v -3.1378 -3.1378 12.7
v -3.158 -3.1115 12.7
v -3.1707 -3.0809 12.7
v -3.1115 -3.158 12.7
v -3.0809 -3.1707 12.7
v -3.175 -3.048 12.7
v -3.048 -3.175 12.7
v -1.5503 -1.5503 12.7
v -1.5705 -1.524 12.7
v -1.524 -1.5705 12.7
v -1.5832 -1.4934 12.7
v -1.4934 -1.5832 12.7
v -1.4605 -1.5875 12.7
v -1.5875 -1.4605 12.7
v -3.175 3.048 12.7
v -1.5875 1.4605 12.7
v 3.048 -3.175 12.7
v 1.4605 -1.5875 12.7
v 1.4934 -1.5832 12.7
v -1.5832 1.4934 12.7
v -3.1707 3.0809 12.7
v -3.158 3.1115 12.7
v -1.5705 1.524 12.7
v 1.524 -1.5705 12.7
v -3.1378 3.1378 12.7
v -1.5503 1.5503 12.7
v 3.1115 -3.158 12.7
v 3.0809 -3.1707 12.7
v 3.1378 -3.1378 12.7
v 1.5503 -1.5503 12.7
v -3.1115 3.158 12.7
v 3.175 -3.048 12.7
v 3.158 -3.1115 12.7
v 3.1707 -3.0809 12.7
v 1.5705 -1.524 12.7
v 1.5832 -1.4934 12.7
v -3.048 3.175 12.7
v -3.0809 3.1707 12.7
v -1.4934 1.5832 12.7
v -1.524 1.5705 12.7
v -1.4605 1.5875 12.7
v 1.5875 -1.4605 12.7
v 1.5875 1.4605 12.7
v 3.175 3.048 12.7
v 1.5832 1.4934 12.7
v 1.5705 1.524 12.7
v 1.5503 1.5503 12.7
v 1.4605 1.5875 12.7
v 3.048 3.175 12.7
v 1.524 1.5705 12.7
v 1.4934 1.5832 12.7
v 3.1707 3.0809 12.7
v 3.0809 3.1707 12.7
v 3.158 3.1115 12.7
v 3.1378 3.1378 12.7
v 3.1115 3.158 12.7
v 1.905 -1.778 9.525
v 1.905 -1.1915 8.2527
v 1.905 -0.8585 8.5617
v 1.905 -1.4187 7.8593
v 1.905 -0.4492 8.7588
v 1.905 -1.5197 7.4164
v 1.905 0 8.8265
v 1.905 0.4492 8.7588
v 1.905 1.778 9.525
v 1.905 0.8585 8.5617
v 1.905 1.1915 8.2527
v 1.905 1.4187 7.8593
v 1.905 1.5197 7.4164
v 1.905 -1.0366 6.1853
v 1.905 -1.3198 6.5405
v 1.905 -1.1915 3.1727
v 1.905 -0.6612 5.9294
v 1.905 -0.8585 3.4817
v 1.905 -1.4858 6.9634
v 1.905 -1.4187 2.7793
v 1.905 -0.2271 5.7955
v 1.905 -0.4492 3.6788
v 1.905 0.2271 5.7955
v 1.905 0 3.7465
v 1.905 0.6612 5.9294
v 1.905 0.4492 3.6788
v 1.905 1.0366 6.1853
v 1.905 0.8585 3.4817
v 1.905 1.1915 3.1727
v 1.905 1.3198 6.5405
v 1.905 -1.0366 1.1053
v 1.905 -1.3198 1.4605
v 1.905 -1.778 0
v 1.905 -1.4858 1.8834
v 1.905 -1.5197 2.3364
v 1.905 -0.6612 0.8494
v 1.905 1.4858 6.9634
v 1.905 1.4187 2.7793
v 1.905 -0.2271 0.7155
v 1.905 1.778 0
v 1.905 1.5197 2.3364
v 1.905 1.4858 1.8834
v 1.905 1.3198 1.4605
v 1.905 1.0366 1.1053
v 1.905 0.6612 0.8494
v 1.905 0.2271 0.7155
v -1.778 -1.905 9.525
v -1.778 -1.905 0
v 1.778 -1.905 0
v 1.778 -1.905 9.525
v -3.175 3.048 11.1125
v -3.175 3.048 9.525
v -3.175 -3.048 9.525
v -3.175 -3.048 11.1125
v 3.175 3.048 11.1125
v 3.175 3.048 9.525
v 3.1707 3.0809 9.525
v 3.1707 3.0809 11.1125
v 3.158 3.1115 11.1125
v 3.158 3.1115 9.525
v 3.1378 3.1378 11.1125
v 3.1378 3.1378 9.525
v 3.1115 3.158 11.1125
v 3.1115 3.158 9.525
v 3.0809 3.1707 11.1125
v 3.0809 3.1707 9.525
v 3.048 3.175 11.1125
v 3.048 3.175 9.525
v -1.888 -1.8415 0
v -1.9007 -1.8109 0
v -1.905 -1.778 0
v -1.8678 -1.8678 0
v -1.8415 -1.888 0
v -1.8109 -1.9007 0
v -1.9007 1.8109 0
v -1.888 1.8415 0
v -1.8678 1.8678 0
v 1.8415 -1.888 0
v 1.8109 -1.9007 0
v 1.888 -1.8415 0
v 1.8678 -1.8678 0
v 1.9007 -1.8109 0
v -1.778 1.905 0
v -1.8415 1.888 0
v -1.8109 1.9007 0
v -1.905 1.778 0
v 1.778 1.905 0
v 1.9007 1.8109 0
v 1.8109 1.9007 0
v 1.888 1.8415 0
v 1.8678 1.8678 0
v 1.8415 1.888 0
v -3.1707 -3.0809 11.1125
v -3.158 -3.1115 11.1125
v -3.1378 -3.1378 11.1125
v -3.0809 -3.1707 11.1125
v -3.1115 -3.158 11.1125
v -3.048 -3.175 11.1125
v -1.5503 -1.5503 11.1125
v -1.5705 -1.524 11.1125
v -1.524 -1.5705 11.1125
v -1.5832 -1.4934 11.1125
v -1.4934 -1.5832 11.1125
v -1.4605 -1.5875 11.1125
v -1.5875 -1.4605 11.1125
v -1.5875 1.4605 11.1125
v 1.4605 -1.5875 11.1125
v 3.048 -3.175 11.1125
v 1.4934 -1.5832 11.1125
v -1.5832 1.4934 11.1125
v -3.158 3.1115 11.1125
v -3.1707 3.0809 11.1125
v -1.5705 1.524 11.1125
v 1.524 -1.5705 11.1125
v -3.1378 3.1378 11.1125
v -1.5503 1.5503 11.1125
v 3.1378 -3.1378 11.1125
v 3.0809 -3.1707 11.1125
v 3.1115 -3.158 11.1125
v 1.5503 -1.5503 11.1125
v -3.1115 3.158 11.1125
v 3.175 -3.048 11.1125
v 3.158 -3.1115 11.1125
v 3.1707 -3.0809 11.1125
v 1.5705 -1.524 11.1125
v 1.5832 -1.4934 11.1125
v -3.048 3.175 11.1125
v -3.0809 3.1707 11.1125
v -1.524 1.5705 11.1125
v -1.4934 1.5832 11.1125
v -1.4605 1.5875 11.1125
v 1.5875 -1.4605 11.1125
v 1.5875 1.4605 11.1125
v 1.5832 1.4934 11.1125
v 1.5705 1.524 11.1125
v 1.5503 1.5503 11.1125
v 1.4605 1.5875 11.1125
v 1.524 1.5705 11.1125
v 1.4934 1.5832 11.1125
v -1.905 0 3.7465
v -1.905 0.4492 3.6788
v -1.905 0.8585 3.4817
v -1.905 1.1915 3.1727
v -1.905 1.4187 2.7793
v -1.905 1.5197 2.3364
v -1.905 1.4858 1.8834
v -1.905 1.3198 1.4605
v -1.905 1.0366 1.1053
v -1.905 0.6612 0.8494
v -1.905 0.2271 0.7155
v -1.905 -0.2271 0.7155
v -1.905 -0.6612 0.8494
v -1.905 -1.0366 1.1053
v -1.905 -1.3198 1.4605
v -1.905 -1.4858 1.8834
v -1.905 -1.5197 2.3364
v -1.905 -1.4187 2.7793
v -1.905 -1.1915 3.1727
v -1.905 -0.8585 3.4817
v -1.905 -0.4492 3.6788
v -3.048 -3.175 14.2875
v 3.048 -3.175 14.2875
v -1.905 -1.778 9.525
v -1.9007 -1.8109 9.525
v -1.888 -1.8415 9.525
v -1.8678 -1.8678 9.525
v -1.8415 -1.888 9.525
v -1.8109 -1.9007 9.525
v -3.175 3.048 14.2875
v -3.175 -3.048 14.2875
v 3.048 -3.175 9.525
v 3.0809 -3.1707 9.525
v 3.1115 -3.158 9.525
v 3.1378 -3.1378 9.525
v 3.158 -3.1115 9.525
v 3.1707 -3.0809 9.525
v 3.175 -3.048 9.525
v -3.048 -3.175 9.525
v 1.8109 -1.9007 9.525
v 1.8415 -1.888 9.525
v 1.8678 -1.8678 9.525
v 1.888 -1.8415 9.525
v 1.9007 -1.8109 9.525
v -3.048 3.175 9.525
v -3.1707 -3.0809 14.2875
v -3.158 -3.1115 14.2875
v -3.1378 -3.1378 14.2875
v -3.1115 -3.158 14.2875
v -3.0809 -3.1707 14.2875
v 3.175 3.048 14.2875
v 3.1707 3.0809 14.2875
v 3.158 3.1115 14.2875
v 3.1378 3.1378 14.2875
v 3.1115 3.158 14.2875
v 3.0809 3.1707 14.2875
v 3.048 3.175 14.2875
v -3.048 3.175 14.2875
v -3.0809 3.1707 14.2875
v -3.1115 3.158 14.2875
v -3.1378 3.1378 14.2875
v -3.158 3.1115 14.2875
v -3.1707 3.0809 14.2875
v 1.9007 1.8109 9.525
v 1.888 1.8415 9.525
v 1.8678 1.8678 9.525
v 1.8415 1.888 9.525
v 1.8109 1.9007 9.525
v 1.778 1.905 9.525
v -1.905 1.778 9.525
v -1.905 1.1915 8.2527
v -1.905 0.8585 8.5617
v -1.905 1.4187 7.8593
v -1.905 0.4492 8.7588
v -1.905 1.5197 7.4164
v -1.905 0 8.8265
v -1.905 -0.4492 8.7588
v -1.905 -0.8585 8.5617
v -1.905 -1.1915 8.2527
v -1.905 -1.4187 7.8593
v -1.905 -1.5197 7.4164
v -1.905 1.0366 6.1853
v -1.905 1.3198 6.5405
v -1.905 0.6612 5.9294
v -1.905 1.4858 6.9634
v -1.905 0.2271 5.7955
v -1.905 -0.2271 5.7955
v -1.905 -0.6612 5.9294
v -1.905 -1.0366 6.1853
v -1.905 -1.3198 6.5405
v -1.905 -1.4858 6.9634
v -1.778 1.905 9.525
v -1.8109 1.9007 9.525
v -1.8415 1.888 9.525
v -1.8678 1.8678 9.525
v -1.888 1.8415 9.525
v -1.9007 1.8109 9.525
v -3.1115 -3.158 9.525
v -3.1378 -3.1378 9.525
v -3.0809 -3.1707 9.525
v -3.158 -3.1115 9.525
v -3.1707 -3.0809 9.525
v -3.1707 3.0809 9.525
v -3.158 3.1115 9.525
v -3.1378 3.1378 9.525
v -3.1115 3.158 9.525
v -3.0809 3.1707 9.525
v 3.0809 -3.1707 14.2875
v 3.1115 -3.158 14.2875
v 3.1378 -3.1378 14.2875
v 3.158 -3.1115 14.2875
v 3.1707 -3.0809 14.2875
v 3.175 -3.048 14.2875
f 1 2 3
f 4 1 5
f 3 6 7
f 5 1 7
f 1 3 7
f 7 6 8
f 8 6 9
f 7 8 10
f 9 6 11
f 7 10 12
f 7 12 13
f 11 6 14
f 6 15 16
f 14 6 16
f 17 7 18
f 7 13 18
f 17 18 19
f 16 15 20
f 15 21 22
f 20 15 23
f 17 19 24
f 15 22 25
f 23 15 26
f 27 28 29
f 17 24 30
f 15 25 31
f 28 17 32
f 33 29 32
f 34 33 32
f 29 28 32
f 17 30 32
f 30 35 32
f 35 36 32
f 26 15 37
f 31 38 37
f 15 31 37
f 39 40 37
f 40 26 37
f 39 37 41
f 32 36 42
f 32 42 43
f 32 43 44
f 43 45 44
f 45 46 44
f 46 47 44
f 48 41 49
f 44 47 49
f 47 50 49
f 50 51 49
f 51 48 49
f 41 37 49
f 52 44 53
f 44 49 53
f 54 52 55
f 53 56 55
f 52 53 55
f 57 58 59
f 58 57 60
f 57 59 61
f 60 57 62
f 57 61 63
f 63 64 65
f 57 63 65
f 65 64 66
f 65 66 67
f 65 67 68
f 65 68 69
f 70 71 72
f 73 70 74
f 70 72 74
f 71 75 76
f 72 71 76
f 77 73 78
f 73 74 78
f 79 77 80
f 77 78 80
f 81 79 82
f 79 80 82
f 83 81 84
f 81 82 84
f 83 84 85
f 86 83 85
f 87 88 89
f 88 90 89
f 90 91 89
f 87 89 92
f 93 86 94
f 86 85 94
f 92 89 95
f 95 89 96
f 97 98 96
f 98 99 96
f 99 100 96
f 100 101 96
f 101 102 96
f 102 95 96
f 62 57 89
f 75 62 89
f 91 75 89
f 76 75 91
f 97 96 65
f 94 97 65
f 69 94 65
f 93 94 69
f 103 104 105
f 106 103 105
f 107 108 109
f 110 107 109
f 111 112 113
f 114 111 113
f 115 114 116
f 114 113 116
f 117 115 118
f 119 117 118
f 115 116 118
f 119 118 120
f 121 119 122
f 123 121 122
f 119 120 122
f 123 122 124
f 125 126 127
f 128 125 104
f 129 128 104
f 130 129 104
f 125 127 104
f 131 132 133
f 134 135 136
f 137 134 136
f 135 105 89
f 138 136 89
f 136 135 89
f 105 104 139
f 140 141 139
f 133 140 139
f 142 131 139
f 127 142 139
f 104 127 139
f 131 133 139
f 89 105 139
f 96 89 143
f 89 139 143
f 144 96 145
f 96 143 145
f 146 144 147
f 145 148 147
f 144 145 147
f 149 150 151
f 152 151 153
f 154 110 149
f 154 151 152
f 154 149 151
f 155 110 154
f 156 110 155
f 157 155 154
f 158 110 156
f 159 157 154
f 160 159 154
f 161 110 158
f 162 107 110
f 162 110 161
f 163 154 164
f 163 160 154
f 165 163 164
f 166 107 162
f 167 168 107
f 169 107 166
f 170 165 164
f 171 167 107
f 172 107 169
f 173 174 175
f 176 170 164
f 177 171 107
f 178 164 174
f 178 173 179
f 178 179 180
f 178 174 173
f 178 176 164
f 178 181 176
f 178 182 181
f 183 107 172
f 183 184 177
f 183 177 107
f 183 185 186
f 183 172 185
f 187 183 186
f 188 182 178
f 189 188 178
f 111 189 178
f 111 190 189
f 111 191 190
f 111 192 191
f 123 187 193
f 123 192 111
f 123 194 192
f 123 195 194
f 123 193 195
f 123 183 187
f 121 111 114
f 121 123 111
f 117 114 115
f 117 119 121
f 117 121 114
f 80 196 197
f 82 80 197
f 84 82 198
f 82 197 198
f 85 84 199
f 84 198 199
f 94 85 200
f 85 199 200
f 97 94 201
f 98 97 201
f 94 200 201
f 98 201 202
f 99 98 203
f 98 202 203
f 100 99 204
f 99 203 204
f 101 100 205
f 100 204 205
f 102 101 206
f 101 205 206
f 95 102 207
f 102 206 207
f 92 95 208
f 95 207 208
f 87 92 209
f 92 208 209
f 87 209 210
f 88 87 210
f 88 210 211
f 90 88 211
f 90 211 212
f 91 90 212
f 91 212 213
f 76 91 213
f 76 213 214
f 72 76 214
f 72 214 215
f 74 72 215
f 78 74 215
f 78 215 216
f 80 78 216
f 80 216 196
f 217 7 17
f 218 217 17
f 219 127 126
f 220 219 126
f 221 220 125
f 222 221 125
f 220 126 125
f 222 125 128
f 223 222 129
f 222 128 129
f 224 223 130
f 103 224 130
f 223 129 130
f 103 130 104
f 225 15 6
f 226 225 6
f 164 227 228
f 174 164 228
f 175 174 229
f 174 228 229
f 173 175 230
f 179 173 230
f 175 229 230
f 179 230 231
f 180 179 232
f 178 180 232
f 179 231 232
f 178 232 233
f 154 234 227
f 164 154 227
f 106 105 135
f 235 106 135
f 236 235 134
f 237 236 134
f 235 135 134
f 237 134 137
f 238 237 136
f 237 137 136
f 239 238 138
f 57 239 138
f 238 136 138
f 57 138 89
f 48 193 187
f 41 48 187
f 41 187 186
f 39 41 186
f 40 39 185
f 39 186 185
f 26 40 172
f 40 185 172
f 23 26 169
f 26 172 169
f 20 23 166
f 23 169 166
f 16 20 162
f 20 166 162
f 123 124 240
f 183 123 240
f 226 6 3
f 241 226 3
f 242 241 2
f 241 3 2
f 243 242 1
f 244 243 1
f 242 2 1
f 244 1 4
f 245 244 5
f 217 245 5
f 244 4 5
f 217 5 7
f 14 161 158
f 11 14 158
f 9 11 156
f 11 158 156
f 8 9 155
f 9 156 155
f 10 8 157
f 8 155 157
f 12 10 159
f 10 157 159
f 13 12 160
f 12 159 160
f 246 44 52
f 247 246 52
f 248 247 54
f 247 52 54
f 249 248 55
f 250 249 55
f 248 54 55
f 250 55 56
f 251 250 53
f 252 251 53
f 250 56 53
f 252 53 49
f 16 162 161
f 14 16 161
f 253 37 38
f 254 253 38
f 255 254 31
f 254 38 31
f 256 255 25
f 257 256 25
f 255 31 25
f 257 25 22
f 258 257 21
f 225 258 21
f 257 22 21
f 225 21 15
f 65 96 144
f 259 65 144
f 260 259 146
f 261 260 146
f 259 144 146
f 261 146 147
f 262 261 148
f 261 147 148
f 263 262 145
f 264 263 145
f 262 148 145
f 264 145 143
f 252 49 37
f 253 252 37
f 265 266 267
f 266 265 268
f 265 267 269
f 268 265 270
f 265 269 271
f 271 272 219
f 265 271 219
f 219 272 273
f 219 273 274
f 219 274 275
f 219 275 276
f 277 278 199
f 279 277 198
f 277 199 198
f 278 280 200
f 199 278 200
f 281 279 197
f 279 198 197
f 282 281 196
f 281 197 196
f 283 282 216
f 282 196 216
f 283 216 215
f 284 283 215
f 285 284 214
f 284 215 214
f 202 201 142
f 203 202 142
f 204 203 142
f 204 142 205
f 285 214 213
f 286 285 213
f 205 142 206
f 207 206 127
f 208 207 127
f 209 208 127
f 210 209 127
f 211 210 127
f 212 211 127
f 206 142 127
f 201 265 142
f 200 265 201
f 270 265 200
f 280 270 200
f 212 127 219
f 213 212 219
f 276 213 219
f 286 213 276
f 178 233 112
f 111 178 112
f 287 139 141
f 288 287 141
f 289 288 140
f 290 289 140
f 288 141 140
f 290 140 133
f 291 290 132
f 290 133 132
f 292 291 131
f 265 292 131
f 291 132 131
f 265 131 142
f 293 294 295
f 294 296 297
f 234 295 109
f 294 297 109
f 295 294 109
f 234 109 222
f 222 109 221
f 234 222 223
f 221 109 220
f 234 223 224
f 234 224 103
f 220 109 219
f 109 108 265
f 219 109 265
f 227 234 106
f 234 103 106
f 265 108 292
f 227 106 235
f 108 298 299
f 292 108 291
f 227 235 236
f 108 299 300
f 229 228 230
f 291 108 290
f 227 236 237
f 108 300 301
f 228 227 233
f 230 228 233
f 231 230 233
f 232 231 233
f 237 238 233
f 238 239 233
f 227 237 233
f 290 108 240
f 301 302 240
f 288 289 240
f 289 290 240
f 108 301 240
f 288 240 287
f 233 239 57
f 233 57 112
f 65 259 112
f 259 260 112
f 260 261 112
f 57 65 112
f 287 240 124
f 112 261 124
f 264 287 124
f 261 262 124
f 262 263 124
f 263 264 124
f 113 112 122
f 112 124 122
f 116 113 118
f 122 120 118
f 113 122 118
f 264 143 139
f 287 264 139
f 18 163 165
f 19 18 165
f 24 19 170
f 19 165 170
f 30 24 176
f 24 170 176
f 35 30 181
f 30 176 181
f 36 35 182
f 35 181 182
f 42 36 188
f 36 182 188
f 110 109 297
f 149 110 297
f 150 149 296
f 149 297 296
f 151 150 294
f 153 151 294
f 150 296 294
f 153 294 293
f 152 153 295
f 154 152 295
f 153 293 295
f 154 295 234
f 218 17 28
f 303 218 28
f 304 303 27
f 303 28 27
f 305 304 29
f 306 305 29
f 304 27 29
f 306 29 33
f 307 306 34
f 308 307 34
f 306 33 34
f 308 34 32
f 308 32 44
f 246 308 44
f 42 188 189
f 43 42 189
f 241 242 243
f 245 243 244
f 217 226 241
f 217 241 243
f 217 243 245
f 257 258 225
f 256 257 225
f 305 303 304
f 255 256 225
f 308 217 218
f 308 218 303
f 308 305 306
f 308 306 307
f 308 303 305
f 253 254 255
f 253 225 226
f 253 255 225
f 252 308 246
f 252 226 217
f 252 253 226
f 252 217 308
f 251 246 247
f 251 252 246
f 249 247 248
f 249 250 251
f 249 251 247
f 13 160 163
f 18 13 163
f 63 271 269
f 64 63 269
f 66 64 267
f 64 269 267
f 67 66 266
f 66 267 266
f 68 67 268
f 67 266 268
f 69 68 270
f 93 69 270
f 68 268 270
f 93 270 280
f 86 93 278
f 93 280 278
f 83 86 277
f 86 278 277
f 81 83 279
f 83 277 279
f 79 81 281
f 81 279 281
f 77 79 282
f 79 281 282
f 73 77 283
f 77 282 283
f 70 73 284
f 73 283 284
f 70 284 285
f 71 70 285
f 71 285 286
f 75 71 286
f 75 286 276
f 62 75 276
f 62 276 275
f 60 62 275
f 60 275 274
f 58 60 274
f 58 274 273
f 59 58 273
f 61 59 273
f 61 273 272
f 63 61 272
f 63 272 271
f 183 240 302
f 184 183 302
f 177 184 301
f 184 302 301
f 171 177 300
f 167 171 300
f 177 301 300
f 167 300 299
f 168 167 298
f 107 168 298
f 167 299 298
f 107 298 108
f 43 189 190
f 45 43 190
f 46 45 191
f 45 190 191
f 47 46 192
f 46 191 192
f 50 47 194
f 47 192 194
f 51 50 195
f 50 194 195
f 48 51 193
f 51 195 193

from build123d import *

# Parameters (mm, degrees)
BOSS_EXTRUDE1_DEPTH = 9.525
BOSS_EXTRUDE2_DEPTH = 1.5875
BOSS_EXTRUDE3_DEPTH = 1.5875
BOSS_EXTRUDE4_DEPTH = 1.5875
SKETCH5_R           = 1.524
CUT_EXTRUDE1_DEPTH  = 6.08


with BuildPart() as part:
    # Sketch1 → Boss-Extrude1 (new body)
    with BuildSketch(Plane.XY):
        with BuildLine():
            Line((-1.778, -1.905), (1.778, -1.905))
            ThreePointArc((1.778, -1.905), (1.867802561, -1.867802561), (1.905, -1.778))
            Line((1.905, -1.778), (1.905, 1.778))
            ThreePointArc((1.905, 1.778), (1.867802561, 1.867802561), (1.778, 1.905))
            Line((1.778, 1.905), (-1.778, 1.905))
            ThreePointArc((-1.778, 1.905), (-1.867802561, 1.867802561), (-1.905, 1.778))
            Line((-1.905, 1.778), (-1.905, -1.778))
            ThreePointArc((-1.905, -1.778), (-1.867802561, -1.867802561), (-1.778, -1.905))
        make_face()
    extrude(amount=BOSS_EXTRUDE1_DEPTH)

    # Sketch2 → Boss-Extrude2 (add)
    with BuildSketch(Plane.XY.offset(9.525)):
        with BuildLine():
            Line((-3.048, -3.175), (3.048, -3.175))
            ThreePointArc((3.048, -3.175), (3.137802561, -3.137802561), (3.175, -3.048))
            Line((3.175, -3.048), (3.175, 3.048))
            ThreePointArc((3.175, 3.048), (3.137802561, 3.137802561), (3.048, 3.175))
            Line((3.048, 3.175), (-3.048, 3.175))
            ThreePointArc((-3.048, 3.175), (-3.137802561, 3.137802561), (-3.175, 3.048))
            Line((-3.175, 3.048), (-3.175, -3.048))
            ThreePointArc((-3.175, -3.048), (-3.137802561, -3.137802561), (-3.048, -3.175))
        make_face()
    extrude(amount=BOSS_EXTRUDE2_DEPTH)

    # Sketch3 → Boss-Extrude3 (add)
    with BuildSketch(Plane.XY.offset(11.1125)):
        with BuildLine():
            Line((-1.4605, -1.5875), (1.4605, -1.5875))
            ThreePointArc((1.4605, -1.5875), (1.550302561, -1.550302561), (1.5875, -1.4605))
            Line((1.5875, -1.4605), (1.5875, 1.4605))
            ThreePointArc((1.5875, 1.4605), (1.550302561, 1.550302561), (1.4605, 1.5875))
            Line((1.4605, 1.5875), (-1.4605, 1.5875))
            ThreePointArc((-1.4605, 1.5875), (-1.550302561, 1.550302561), (-1.5875, 1.4605))
            Line((-1.5875, 1.4605), (-1.5875, -1.4605))
            ThreePointArc((-1.5875, -1.4605), (-1.550302561, -1.550302561), (-1.4605, -1.5875))
        make_face()
    extrude(amount=BOSS_EXTRUDE3_DEPTH)

    # Sketch4 → Boss-Extrude4 (add)
    with BuildSketch(Plane.XY.offset(12.7)):
        with BuildLine():
            Line((-3.048, -3.175), (3.048, -3.175))
            ThreePointArc((3.048, -3.175), (3.137802561, -3.137802561), (3.175, -3.048))
            Line((3.175, -3.048), (3.175, 3.048))
            ThreePointArc((3.175, 3.048), (3.137802561, 3.137802561), (3.048, 3.175))
            Line((3.048, 3.175), (-3.048, 3.175))
            ThreePointArc((-3.048, 3.175), (-3.137802561, 3.137802561), (-3.175, 3.048))
            Line((-3.175, 3.048), (-3.175, -3.048))
            ThreePointArc((-3.175, -3.048), (-3.137802561, -3.137802561), (-3.048, -3.175))
        make_face()
    extrude(amount=BOSS_EXTRUDE4_DEPTH)

    # Sketch5 → Cut-Extrude1 (cut, through all)
    with BuildSketch(Plane.ZY.offset(1.905)):
        with Locations((2.2225, 0)):
            Circle(SKETCH5_R)
        with Locations((7.3025, 0)):
            Circle(SKETCH5_R)
    extrude(amount=-CUT_EXTRUDE1_DEPTH, mode=Mode.SUBTRACT)


solid = part.part
